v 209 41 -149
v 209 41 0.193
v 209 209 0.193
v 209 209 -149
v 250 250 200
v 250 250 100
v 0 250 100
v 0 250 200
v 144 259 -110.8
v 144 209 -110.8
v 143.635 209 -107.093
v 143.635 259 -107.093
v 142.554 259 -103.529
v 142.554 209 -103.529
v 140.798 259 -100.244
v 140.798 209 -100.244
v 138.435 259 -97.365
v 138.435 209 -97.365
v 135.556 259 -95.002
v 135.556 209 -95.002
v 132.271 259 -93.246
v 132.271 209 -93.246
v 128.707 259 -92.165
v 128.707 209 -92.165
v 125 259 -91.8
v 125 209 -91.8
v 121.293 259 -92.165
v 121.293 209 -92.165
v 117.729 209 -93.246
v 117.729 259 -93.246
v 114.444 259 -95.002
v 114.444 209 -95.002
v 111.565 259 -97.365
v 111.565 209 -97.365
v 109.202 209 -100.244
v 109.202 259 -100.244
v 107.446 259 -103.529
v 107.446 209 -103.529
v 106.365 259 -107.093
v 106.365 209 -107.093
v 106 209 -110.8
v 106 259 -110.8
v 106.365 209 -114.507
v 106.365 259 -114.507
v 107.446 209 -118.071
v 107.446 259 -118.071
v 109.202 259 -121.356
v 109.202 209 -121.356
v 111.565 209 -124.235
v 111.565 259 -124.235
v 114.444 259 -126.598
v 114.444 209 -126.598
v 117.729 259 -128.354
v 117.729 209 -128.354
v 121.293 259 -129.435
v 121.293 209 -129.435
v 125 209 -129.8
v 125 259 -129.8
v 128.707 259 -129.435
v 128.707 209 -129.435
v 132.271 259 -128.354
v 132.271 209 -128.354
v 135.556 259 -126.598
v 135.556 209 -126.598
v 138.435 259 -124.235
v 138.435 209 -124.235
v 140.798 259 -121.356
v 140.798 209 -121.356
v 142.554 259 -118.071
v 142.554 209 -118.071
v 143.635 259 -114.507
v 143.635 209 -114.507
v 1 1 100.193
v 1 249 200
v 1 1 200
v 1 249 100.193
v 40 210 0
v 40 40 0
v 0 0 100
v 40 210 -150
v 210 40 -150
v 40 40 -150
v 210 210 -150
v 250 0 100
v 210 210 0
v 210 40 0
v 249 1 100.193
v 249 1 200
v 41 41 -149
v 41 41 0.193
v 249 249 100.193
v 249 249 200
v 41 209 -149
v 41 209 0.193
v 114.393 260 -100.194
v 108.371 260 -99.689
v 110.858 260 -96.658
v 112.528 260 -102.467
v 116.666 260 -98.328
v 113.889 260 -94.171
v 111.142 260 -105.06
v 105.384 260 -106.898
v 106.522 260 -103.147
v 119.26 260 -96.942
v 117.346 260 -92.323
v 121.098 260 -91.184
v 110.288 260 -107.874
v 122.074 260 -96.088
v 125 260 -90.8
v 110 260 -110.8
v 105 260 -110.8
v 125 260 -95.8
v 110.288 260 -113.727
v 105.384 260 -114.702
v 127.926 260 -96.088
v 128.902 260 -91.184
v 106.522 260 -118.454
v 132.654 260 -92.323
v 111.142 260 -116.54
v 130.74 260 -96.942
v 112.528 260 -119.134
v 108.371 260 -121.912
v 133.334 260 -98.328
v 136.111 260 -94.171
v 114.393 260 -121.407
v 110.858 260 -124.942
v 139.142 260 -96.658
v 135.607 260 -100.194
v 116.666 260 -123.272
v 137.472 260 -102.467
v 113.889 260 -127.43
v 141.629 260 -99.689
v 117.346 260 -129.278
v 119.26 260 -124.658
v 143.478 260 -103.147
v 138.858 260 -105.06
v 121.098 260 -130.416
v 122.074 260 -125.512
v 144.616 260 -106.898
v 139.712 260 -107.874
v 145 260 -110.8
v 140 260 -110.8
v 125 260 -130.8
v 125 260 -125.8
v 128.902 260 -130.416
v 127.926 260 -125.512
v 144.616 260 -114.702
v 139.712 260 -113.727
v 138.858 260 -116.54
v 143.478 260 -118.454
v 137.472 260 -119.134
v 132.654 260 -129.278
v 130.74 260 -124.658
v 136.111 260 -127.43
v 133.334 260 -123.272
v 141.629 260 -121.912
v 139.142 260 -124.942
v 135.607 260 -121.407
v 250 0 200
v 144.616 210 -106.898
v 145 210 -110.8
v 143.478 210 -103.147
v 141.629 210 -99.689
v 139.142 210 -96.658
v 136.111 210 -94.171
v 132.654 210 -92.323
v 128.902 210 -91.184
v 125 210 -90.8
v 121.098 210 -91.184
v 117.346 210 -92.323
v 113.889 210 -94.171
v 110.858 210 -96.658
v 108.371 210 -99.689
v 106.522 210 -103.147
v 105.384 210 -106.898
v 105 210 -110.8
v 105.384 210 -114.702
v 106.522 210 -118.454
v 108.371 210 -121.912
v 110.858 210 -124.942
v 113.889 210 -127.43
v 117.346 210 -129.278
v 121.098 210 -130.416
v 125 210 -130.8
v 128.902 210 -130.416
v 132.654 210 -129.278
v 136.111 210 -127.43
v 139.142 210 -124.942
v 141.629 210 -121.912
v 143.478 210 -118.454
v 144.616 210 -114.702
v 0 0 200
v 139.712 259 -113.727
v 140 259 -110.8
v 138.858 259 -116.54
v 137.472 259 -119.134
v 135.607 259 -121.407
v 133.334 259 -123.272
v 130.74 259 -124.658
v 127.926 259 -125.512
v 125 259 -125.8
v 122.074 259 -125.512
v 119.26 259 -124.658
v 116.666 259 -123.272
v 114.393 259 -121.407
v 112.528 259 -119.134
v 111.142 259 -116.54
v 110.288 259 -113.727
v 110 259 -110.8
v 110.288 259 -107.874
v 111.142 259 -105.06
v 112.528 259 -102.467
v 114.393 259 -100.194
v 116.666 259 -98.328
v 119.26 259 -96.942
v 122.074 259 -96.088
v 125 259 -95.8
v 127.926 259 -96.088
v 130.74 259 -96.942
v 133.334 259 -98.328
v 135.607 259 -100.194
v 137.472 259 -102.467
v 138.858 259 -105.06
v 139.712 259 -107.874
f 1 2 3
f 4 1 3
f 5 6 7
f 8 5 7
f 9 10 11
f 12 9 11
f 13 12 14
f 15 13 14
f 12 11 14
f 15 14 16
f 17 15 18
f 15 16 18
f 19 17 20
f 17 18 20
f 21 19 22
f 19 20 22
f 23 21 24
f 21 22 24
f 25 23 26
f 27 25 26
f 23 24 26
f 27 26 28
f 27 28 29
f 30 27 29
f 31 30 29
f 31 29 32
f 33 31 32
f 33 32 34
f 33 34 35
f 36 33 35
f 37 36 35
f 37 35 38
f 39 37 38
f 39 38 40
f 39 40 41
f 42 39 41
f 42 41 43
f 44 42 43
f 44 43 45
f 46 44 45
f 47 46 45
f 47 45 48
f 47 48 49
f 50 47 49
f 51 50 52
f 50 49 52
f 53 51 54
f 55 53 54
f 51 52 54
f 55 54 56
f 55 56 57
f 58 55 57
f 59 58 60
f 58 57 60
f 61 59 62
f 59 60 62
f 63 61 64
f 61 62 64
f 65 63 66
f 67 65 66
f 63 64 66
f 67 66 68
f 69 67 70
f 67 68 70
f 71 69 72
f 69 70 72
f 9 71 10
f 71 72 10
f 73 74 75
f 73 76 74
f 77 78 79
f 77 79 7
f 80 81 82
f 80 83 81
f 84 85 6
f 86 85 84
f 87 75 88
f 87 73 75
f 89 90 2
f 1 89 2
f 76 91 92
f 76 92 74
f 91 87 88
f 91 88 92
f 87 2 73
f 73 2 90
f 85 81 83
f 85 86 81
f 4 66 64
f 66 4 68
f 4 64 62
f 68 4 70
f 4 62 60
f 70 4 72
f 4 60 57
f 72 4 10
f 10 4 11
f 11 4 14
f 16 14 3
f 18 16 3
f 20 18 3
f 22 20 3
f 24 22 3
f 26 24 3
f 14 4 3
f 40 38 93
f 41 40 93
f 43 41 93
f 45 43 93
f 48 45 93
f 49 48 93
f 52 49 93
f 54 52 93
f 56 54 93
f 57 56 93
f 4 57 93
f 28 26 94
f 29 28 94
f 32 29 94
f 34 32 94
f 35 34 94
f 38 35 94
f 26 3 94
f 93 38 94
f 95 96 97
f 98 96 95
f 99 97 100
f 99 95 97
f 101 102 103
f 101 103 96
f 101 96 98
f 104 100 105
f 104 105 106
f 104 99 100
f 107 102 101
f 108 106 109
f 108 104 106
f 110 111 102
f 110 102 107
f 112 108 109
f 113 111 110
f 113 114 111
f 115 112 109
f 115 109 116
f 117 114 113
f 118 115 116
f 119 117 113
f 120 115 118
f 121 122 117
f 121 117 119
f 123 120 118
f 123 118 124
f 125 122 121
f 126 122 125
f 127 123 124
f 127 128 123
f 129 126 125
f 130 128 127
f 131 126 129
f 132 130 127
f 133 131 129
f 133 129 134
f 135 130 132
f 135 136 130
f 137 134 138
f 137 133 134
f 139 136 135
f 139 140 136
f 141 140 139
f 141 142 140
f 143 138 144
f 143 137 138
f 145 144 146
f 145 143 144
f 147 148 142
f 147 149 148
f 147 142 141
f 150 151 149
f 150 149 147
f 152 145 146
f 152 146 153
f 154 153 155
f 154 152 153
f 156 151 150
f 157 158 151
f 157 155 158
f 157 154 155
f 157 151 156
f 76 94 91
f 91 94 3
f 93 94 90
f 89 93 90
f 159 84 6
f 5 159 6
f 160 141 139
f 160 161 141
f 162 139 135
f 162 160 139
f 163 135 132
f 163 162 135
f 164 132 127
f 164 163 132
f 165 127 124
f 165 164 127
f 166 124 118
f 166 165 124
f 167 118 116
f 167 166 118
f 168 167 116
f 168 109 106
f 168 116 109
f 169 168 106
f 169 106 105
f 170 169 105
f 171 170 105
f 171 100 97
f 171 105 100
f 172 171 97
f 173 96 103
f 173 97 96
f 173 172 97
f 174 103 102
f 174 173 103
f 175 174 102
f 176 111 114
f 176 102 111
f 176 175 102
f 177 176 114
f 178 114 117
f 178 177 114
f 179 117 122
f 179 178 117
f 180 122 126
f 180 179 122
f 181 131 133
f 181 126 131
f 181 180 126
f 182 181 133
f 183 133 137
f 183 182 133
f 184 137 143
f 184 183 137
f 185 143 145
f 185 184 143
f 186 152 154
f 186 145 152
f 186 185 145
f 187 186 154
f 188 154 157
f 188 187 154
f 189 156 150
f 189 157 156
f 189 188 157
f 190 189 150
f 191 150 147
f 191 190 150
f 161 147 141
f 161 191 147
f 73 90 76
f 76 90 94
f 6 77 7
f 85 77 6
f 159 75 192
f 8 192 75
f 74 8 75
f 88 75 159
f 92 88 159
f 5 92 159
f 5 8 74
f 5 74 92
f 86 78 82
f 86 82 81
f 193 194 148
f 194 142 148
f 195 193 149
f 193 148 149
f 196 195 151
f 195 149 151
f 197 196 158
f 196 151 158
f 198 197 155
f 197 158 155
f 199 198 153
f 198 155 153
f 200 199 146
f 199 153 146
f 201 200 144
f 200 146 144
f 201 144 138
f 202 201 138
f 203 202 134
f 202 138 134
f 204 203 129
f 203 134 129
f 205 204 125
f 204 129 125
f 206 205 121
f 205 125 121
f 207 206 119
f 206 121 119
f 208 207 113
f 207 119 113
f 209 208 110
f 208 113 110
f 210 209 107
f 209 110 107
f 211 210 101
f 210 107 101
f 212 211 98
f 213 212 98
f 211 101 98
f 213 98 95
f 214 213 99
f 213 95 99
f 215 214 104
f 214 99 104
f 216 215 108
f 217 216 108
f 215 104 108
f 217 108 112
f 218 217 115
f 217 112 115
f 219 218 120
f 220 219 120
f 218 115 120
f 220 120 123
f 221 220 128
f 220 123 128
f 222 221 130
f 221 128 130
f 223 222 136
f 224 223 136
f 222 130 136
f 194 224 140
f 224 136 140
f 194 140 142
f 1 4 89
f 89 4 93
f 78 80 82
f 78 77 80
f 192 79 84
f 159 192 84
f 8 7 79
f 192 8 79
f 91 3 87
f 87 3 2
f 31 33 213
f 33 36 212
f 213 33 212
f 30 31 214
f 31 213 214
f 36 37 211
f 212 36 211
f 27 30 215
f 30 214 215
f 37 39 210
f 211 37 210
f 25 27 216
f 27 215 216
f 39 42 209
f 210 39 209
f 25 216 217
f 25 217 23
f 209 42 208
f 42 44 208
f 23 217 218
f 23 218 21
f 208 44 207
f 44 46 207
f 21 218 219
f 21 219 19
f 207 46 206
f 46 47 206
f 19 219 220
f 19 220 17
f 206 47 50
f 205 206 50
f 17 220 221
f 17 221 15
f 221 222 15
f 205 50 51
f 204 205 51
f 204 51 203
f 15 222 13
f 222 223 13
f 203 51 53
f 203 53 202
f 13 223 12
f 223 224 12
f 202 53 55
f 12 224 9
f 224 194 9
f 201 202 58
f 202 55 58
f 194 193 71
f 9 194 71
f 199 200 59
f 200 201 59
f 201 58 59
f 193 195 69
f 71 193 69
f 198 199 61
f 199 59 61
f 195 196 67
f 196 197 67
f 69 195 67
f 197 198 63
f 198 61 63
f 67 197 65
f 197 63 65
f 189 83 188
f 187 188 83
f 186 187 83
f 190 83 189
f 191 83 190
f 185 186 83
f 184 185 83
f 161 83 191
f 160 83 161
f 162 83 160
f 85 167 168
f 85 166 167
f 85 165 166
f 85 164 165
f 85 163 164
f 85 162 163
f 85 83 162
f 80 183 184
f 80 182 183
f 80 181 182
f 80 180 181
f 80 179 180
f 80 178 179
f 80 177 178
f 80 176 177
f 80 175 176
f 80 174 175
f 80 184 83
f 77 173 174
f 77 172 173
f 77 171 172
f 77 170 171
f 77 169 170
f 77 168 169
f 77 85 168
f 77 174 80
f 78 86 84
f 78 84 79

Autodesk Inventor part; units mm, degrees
ref_plane "YZ Plane" through (0, 0, 0) normal (1, 0, 0) x (0, 1, 0)
ref_plane "XZ Plane" through (0, 0, 0) normal (0, 1, 0) x (-1, 0, 0)
ref_plane "XY Plane" through (0, 0, 0) normal (0, 0, 1) x (1, 0, 0)
sketch "Sketch1" plane through (0, 0, 0) normal (0, 0, 1) x (1, 0, 0)
  line L0 (0, 0) -> (250, 0)
  line L1 (250, 0) -> (250, 250)
  line L2 (250, 250) -> (0, 250)
  line L3 (0, 250) -> (0, 0)
  dimension "d0" = 250
  dimension "d1" = 250
extrude "Extrusion1" add sketch "Sketch1" along normal blind 200
chamfer "Chamfer1" distance 100 distance2 40 1 edges at (0, 125, 0) measured on face at (0, 166.6667, 66.6667)
chamfer "Chamfer2" distance 100 distance2 40 1 edges at (145, 0, 0) measured on face at (180, 0, 66.6667)
chamfer "Chamfer3" distance 100 distance2 40 1 edges at (145, 250, 0) measured on face at (180, 250, 66.6667)
chamfer "Chamfer4" distance 100 distance2 40 1 edges at (250, 125, 0) measured on face at (250, 166.6667, 133.3333)
sketch "Sketch2" plane through (0, 0, 0) normal (0, 0, -1) x (-1, 0, 0)
  line L0 (-40, 40) -> (-210, 40) projected
  line L1 (-210, 210) -> (-40, 210) projected
  line L2 (-40, 40) -> (-210, 40)
  line L3 (-210, 40) -> (-210, 210)
  line L4 (-210, 210) -> (-40, 210)
  line L5 (-40, 210) -> (-40, 40)
  point P0 (0, 0)
extrude "Extrusion2" add sketch "Sketch2" along normal blind 150
sketch "Sketch3" plane through (40, 210, 0) normal (0, 1, 0) x (1, 0, 0)
  circle A0 centre (85, 110.8002) radius 20
  point P0 (-40, 0)
  dimension "d18" = 40
extrude "Extrusion3" add sketch "Sketch3" along normal blind 50
sketch "Sketch4" plane through (125, 260, -110.8002) normal (0, 1, 0) x (1, 0, 0)
  circle A0 centre (0, 0) radius 15
  point P0 (-125, -110.8002)
  dimension "d21" = 30
shell "Shell1" thickness 1 removed faces 1 at (83.3333, 166.6667, 200)
extrude "Extrusion4" cut sketch "Sketch4" against normal blind 60
sketch "Sketch5" plane through (40, 210, 0) normal (0, 1, 0) x (1, 0, 0)
  circle A0 centre (49.0593, 110.2763) radius 5
  point P0 (-40, 0)
  dimension "d25" = 10
extrude "Extrusion5" [suppressed]
sketch "Sketch6" plane through (89.0593, 290, -110.2763) normal (0, 1, 0) x (1, 0, 0)
  circle A0 centre (0, 0) radius 5 projected
  line L0 (-5, 0) -> (5, 0)
  line L1 (5, 0) -> (5, -80.1533)
  line L2 (5, -80.1533) -> (-5, -80.1533)
  line L3 (-5, -80.1533) -> (-5, 0)
  point P0 (-89.0593, -110.2763)
extrude "Extrusion6" [suppressed]
sketch "Sketch7" plane through (0, 250, 100) normal (0, 0.9285, -0.3714) x (1, 0, 0)
  point P0 (0, 185.6953)
properties part number "my_subsystem"
